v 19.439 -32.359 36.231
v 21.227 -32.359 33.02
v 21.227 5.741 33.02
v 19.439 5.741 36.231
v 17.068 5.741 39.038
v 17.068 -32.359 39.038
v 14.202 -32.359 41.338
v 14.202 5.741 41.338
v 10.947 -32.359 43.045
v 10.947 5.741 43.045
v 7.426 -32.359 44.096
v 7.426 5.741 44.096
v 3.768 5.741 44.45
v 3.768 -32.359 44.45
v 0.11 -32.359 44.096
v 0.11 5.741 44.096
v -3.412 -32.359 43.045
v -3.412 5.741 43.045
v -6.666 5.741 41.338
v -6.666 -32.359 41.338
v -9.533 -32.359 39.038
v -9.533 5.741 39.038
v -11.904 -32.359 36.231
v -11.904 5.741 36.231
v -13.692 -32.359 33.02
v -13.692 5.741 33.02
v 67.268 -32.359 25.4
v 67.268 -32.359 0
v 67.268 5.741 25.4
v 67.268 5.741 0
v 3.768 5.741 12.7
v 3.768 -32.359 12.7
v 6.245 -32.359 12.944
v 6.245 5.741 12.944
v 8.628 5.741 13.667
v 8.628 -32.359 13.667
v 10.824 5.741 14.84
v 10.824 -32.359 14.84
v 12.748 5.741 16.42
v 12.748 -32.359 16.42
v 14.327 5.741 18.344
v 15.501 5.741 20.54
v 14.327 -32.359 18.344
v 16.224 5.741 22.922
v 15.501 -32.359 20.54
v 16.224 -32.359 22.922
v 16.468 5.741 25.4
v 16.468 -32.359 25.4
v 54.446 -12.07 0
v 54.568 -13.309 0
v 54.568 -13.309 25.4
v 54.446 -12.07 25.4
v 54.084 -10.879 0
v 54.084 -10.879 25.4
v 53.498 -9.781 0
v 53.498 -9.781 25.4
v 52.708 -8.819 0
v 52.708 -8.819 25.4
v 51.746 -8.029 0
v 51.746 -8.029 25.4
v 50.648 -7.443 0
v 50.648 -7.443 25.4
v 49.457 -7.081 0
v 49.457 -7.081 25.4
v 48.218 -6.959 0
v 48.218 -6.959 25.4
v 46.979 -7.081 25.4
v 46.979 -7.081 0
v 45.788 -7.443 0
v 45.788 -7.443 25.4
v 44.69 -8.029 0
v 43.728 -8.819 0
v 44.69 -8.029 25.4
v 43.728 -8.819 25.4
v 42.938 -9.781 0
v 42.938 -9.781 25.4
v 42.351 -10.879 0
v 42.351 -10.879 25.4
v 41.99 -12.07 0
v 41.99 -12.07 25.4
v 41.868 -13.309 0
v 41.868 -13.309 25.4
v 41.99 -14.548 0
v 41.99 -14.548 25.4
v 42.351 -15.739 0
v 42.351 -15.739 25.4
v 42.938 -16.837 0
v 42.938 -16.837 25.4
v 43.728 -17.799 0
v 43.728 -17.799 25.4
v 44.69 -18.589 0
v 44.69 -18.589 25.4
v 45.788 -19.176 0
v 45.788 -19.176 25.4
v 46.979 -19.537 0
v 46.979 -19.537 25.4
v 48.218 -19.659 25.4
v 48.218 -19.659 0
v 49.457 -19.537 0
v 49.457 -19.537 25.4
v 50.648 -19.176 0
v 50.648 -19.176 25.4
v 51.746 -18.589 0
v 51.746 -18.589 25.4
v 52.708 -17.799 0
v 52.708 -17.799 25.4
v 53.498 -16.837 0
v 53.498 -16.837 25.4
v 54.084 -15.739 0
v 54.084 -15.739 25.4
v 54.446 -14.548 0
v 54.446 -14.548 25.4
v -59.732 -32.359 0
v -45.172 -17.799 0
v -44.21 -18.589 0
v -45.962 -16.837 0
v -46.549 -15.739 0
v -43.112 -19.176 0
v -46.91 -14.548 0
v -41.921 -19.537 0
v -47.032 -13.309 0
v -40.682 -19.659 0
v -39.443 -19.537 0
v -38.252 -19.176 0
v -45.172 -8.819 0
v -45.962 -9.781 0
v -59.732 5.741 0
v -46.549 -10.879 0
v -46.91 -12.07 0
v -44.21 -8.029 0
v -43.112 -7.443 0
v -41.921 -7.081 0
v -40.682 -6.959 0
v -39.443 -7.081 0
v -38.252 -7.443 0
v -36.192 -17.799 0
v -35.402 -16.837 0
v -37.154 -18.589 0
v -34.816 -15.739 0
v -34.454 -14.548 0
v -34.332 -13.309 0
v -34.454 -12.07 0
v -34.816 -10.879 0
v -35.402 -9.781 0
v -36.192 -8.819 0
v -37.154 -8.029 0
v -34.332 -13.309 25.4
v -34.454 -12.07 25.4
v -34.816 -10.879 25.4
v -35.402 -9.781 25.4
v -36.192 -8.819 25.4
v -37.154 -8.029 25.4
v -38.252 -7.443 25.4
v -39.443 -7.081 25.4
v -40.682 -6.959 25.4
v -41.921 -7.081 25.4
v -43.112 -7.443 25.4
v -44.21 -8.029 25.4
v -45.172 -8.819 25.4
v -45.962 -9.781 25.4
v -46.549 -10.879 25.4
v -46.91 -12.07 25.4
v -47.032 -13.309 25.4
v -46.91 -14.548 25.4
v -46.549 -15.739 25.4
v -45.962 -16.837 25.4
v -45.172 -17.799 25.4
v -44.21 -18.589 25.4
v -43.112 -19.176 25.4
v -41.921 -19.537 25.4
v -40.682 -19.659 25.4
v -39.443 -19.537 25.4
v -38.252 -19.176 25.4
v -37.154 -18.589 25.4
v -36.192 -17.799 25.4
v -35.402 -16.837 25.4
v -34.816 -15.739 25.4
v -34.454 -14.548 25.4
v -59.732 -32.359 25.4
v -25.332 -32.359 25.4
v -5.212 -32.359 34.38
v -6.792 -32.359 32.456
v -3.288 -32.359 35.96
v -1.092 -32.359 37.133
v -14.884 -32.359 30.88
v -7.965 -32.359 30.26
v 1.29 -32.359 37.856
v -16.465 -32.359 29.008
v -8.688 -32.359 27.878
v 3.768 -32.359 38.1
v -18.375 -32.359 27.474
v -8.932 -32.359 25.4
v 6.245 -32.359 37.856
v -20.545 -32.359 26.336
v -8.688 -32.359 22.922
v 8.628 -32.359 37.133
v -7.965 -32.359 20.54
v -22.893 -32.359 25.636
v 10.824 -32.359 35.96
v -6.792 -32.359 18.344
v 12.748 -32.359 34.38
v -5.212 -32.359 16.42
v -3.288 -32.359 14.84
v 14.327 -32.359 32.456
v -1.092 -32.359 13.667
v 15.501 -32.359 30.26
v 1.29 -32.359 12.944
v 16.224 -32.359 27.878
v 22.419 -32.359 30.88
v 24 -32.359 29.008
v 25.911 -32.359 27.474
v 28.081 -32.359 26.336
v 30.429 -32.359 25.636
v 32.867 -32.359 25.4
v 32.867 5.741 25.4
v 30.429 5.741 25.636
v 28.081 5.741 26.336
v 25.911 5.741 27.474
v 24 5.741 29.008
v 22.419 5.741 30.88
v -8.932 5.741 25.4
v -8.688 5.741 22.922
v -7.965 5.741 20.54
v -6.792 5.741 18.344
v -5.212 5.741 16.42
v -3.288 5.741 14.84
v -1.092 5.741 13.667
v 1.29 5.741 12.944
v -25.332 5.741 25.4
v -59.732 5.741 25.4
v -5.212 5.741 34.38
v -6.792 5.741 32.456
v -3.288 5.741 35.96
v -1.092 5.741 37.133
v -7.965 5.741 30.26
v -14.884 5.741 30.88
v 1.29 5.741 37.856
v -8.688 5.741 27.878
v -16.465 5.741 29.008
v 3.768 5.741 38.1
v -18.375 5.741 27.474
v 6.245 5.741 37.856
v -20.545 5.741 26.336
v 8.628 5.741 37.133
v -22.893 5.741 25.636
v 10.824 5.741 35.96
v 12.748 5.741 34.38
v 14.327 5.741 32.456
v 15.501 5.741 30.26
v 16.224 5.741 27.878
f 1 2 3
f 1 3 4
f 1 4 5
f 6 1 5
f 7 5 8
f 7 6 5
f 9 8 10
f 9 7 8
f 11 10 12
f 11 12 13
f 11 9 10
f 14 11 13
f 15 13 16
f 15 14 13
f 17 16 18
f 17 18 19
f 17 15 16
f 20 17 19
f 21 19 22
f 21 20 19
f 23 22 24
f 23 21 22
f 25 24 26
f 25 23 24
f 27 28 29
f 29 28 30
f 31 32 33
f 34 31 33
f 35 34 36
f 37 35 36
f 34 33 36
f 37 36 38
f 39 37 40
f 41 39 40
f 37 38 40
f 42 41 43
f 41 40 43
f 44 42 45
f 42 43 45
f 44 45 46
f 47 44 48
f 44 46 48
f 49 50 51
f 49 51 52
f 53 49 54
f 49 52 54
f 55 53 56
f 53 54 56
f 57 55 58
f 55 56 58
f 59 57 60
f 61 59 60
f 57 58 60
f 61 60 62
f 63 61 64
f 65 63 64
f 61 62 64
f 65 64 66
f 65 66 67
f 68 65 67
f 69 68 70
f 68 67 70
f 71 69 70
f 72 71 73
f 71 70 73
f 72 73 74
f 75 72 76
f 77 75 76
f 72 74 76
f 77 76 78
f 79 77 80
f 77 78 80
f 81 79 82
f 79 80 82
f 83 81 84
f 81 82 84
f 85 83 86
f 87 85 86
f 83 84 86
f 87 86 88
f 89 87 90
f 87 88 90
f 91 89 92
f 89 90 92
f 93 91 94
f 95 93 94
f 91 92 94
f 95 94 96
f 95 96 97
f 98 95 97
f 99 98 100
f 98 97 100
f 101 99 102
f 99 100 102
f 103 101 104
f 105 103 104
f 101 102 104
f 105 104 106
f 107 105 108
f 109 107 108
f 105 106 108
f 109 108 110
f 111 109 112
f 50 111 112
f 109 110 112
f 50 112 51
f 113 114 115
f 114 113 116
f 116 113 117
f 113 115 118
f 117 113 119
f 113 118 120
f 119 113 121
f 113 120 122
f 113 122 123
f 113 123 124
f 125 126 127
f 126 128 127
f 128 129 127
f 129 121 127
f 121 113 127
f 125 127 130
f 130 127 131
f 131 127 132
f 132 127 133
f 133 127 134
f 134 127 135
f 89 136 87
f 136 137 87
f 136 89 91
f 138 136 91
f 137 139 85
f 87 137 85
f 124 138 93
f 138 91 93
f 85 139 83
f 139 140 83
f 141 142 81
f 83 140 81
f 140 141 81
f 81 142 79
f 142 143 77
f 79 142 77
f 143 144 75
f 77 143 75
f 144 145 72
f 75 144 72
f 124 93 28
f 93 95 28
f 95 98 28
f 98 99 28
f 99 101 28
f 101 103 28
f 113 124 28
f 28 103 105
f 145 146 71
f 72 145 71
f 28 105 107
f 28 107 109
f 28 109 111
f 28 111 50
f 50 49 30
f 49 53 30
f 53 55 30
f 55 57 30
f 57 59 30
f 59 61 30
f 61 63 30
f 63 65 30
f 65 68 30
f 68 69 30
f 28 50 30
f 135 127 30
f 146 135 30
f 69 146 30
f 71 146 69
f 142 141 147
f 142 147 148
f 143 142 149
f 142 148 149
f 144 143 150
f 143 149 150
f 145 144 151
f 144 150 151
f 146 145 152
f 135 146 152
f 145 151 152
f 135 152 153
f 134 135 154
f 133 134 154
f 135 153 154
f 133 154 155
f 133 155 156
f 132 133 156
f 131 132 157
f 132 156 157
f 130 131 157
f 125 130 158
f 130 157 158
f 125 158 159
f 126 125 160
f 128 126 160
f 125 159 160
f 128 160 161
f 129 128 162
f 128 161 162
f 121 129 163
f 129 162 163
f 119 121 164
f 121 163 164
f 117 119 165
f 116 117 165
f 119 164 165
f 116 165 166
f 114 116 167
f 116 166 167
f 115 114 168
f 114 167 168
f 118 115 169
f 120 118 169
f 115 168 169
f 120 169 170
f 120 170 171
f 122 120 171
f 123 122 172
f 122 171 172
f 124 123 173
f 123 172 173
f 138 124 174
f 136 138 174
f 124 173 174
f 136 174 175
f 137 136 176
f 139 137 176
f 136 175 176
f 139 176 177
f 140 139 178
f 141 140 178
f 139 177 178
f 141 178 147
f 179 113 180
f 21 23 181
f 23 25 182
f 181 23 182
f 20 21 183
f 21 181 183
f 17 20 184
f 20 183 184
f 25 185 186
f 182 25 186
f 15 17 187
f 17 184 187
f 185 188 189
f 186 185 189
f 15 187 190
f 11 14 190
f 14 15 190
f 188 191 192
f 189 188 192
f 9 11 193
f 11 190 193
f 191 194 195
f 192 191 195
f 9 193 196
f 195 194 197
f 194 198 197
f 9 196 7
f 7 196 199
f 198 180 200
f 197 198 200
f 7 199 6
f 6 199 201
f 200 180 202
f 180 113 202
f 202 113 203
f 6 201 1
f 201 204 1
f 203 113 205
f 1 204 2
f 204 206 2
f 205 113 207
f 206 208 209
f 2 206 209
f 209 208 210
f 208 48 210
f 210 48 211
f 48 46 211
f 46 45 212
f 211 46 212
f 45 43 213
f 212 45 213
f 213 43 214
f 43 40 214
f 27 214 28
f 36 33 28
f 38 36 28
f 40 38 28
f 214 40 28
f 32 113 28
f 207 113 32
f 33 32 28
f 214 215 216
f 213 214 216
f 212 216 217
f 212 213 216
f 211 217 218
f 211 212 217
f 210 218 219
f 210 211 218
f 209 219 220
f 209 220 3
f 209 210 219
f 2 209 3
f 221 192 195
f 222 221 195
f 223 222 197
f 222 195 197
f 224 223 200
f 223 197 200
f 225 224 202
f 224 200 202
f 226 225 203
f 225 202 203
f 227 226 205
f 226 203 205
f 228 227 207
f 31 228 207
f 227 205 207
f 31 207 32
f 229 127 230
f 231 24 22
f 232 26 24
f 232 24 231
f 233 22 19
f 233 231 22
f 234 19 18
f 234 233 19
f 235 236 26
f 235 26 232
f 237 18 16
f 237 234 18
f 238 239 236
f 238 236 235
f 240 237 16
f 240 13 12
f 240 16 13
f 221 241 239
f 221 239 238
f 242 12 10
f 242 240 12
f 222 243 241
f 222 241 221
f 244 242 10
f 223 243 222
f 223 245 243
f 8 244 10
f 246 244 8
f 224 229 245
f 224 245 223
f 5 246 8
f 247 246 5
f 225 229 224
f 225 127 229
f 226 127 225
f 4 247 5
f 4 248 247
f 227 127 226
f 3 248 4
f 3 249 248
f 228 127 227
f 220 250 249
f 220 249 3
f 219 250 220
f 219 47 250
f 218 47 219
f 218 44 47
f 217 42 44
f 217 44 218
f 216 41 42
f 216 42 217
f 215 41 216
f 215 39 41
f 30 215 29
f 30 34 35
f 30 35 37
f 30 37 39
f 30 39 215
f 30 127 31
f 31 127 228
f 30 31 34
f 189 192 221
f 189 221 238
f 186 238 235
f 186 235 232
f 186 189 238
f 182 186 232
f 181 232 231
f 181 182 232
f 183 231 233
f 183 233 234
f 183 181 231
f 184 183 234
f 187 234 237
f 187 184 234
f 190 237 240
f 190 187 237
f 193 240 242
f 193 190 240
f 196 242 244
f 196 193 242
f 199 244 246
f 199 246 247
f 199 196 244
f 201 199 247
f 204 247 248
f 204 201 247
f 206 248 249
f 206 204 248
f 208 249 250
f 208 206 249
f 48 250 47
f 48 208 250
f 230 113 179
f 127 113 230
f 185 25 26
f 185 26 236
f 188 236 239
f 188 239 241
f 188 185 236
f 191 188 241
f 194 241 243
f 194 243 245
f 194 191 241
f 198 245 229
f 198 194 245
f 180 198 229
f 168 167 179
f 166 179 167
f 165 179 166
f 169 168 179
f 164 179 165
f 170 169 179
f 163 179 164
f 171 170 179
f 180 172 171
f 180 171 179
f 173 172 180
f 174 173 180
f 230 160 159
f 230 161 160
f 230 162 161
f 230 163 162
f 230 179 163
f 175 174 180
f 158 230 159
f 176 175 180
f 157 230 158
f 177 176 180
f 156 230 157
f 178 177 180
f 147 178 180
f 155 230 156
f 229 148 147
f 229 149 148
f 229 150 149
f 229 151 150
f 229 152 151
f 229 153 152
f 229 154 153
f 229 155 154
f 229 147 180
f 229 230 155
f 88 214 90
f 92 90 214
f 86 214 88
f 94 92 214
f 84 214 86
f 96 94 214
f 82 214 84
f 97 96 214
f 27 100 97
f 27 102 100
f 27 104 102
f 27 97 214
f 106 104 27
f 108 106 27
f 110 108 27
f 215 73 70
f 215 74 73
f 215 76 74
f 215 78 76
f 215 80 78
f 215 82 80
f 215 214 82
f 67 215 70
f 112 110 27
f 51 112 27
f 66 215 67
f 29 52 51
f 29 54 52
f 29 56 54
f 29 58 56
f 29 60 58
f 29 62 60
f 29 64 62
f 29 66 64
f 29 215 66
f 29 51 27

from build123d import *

# Parameters (mm, degrees)
F0_W     = 127
F0_H     = 38.1
F1_DEPTH = 25.4
F4_DEPTH = 38.1
F5_DEPTH = 38.1
F3_R     = 6.35
F6_DEPTH = 25.4


with BuildPart() as f1:
    # F0 (on Top) → F1 (new body)
    with BuildSketch(Plane.XY):
        with Locations((3.767781, -13.309208)):
            Rectangle(F0_W, F0_H)
    extrude(amount=F1_DEPTH)

    # F2 (on face) → F4 (join)
    with BuildSketch(Plane.XZ.offset(32.359208)):
        with BuildLine():
            Line((-25.331575, 25.4), (-8.932219, 25.4))
            ThreePointArc((-8.932219, 25.4), (3.767781, 38.1), (16.467781, 25.4))
            Line((16.467781, 25.4), (32.867137, 25.4))
            ThreePointArc((32.867137, 25.4), (25.91106, 27.474418), (21.227394, 33.02))
            ThreePointArc((21.227394, 33.02), (3.767781, 44.45), (-13.691832, 33.02))
            ThreePointArc((-13.691832, 33.02), (-18.375498, 27.474418), (-25.331575, 25.4))
        make_face()
    extrude(amount=-F4_DEPTH)

    # F2 (on face) → F5 (cut)
    with BuildSketch(Plane.XZ.offset(32.359208)):
        with BuildLine():
            ThreePointArc((-8.932219, 25.4), (-5.212475, 16.419744), (3.767781, 12.7))
            Line((3.767781, 12.7), (3.767781, 25.4))
            Line((3.767781, 25.4), (-8.932219, 25.4))
        make_face()
        with BuildLine():
            Line((3.767781, 25.4), (3.767781, 12.7))
            ThreePointArc((3.767781, 12.7), (12.748037, 16.419744), (16.467781, 25.4))
            Line((16.467781, 25.4), (3.767781, 25.4))
        make_face()
    extrude(amount=-F5_DEPTH, mode=Mode.SUBTRACT)

    # F3 (on face) → F6 (cut)
    with BuildSketch(Plane.XY.offset(25.4)):
        with Locations((-40.682219, -13.309208)):
            Circle(F3_R)
        with Locations((48.217781, -13.309208)):
            Circle(F3_R)
    extrude(amount=-F6_DEPTH, mode=Mode.SUBTRACT)


solid = f1.part
